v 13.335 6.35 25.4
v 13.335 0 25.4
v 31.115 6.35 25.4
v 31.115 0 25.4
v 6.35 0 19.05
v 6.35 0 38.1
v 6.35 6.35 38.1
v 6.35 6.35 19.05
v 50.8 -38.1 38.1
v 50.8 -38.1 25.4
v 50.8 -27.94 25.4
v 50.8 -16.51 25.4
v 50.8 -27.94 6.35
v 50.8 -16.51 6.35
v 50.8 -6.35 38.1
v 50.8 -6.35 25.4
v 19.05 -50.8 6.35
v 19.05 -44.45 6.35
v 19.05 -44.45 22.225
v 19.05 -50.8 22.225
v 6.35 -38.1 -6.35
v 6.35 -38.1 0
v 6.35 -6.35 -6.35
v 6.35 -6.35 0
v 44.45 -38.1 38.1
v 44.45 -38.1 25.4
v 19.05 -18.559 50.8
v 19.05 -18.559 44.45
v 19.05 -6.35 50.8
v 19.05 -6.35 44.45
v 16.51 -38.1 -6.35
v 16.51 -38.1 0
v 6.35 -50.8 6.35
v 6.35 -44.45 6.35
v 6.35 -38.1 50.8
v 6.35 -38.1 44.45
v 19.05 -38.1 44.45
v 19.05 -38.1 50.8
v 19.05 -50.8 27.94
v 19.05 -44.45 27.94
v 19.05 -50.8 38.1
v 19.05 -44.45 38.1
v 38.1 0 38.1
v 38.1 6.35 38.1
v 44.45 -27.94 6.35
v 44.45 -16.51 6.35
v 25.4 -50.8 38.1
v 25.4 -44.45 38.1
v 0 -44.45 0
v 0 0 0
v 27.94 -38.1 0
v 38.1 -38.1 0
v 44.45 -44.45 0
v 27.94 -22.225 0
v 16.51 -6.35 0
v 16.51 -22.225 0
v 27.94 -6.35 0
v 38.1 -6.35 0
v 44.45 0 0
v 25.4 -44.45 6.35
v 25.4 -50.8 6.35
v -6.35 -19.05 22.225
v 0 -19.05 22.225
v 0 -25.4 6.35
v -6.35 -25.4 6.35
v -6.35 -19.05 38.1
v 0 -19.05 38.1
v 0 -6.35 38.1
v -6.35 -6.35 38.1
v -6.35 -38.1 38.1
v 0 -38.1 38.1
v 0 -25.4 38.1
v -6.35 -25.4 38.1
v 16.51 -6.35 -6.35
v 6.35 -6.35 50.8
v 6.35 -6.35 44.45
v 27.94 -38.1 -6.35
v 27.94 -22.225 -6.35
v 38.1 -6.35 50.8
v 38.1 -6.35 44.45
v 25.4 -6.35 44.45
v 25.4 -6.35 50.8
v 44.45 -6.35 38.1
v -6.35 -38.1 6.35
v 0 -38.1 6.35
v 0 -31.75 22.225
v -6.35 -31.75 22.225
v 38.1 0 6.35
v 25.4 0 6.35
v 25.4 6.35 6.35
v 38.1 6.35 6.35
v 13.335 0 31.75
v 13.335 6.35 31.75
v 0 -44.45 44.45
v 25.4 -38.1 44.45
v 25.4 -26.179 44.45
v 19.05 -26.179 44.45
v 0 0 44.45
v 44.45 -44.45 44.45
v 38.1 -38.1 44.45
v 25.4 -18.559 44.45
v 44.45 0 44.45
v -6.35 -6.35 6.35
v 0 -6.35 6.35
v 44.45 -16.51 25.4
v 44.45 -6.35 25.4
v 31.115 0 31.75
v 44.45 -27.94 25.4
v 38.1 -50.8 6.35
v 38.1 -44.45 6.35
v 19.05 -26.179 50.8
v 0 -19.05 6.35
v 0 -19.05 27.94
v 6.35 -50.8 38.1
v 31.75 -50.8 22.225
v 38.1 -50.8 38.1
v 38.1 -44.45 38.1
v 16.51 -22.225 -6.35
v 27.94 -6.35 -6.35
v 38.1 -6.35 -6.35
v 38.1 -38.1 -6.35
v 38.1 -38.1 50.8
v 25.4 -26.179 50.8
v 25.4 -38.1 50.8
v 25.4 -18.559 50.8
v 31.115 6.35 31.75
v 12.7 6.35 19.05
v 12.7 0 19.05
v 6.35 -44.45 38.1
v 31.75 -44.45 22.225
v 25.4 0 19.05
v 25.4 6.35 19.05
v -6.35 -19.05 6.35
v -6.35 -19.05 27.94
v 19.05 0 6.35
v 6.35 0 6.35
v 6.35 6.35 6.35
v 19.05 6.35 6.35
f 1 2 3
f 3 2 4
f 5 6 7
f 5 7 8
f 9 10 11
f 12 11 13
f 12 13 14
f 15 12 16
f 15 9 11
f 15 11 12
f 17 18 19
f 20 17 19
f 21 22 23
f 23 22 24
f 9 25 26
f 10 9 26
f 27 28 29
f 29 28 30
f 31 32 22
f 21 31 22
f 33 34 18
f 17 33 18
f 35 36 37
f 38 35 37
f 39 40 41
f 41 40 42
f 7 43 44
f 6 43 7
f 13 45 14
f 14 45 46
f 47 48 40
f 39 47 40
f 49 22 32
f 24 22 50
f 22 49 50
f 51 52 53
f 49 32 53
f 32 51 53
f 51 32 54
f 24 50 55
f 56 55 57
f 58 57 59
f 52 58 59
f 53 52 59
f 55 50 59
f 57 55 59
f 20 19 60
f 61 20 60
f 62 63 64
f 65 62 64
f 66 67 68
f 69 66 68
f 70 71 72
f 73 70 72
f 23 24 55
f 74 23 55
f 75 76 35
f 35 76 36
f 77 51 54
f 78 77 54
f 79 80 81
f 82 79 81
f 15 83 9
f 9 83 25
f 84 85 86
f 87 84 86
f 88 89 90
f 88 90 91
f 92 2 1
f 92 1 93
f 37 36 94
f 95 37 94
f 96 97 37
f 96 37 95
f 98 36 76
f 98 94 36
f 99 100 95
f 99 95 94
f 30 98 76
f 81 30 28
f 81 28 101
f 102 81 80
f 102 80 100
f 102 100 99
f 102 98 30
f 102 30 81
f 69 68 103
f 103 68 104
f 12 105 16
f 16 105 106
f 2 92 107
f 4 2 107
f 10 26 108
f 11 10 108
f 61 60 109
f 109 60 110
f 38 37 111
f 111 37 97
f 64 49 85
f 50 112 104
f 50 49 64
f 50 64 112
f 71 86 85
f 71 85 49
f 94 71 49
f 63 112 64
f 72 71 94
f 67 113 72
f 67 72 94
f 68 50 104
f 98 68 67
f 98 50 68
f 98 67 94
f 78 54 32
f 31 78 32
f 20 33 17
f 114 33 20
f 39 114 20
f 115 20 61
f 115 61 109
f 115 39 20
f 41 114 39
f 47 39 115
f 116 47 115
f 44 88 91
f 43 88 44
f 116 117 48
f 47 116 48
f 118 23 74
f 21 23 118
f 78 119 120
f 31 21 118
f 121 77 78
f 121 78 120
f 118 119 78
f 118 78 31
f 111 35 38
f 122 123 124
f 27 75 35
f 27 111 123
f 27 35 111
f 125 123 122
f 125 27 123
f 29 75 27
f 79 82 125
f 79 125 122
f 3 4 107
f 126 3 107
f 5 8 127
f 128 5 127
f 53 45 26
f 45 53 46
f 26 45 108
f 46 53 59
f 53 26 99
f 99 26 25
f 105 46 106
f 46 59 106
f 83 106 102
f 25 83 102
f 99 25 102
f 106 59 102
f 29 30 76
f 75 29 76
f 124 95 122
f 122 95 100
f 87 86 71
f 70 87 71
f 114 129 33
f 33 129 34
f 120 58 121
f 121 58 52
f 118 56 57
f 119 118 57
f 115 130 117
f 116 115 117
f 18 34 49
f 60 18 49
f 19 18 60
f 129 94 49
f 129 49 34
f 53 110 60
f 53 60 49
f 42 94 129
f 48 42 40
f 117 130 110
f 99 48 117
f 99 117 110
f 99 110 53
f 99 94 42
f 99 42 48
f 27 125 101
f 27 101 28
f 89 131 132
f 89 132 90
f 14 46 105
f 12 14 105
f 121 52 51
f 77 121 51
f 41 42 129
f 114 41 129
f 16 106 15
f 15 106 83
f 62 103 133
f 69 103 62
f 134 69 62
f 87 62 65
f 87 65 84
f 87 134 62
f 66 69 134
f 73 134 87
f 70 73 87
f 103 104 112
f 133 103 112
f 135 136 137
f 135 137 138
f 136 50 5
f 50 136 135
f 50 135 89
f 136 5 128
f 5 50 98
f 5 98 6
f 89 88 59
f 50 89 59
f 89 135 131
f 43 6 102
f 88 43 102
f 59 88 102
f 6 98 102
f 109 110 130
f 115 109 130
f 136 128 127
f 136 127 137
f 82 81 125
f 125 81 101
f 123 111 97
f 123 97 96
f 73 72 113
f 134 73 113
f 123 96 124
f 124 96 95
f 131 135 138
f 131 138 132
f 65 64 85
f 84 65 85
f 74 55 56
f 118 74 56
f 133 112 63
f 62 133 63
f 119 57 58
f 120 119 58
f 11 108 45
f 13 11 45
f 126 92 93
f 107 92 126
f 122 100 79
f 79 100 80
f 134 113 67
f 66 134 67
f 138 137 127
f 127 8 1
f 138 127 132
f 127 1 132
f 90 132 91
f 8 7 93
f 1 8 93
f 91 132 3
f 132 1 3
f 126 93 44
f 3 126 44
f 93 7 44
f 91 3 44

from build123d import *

# Parameters (mm, degrees)
F0_W      = 44.45
F0_H      = 44.45
F1_DEPTH  = 44.45
F4_DEPTH  = 6.35
F5_W      = 17.78
F5_H      = 6.35
F6_DEPTH  = 6.35
F8_DEPTH  = 6.35
F10_DEPTH = 6.35
F11_DEPTH = 6.35
F13_DEPTH = 6.35
F6_FACE_W = 17.78
F6_FACE_H = 6.35
F14_DEPTH = 6.35


with BuildPart() as f1:
    # F0 (on Front) → F1 (new body)
    with BuildSketch(Plane.XZ):
        with Locations((22.225, 22.225)):
            Rectangle(F0_W, F0_H)
    extrude(amount=F1_DEPTH)

    # F3 (on face) → F4 (join)
    with BuildSketch(Plane.YZ.offset(44.45)):
        Polygon((-27.94, 25.4), (-27.94, 6.35), (-16.51, 6.35), (-16.51, 25.4), (-6.35, 25.4), (-6.35, 38.1), (-38.1, 38.1), (-38.1, 25.4), align=None)
    extrude(amount=F4_DEPTH)

    # F5 (on Front) → F6 (join)
    with BuildSketch(Plane.XZ):
        Polygon((25.4, 6.35), (38.1, 6.35), (38.1, 38.1), (6.35, 38.1), (6.35, 19.05), (12.7, 19.05), (6.35, 6.35), (19.05, 6.35), (25.4, 19.05), align=None)
        with Locations((22.225, 28.575)):
            Rectangle(F5_W, F5_H, mode=Mode.SUBTRACT)
    extrude(amount=-F6_DEPTH)

    # F7 (on face) → F8 (join)
    with BuildSketch(Plane.XY.offset(44.45)):
        Polygon((19.05, -6.35), (6.35, -6.35), (6.35, -38.1), (19.05, -38.1), (19.05, -26.1793940588), (25.4, -26.1793940588), (25.4, -38.1), (38.1, -38.1), (38.1, -6.35), (25.4, -6.35), (25.4, -18.5593940588), (19.05, -18.5593940588), align=None)
    extrude(amount=F8_DEPTH)

    # F9 (on face) → F10 (join)
    with BuildSketch(Plane(origin=(0, 0, 0), x_dir=(1, 0, 0), z_dir=(0, 0, -1))):
        Polygon((6.35, 38.1), (6.35, 6.35), (16.51, 6.35), (16.51, 22.225), (27.94, 6.35), (38.1, 6.35), (38.1, 38.1), (27.94, 38.1), (27.94, 22.225), (16.51, 38.1), align=None)
    extrude(amount=F10_DEPTH)

    # F2 (on face) → F11 (join)
    with BuildSketch(Plane.XZ.offset(44.45)):
        Polygon((19.05, 38.1), (6.35, 38.1), (6.35, 6.35), (19.05, 6.35), (19.05, 22.225), (25.4, 6.35), (38.1, 6.35), (31.75, 22.225), (38.1, 38.1), (25.4, 38.1), (19.05, 27.94), align=None)
    extrude(amount=F11_DEPTH)

    # F12 (on face) → F13 (join)
    with BuildSketch(Plane(origin=(0, 0, 0), x_dir=(0, -1, 0), z_dir=(-1, 0, 0))):
        Polygon((6.35, 38.1), (6.35, 6.35), (19.05, 6.35), (19.05, 22.225), (25.4, 6.35), (38.1, 6.35), (31.75, 22.225), (38.1, 38.1), (25.4, 38.1), (19.05, 27.94), (19.05, 38.1), align=None)
    extrude(amount=F13_DEPTH)

    # F5 (on Front) + F6_face (on face) → F14 (join)
    with BuildSketch(Plane.XZ):
        Polygon((25.4, 6.35), (38.1, 6.35), (38.1, 38.1), (6.35, 38.1), (6.35, 19.05), (12.7, 19.05), (6.35, 6.35), (19.05, 6.35), (25.4, 19.05), align=None)
        with Locations((22.225, 28.575)):
            Rectangle(F5_W, F5_H, mode=Mode.SUBTRACT)
    with BuildSketch(Plane(origin=(22.225, 0, 28.575), x_dir=(-1, 0, 0), z_dir=(0, 1, 0))):
        Rectangle(F6_FACE_W, F6_FACE_H)
    extrude(amount=F14_DEPTH, dir=(0, -1, 0))


solid = f1.part
